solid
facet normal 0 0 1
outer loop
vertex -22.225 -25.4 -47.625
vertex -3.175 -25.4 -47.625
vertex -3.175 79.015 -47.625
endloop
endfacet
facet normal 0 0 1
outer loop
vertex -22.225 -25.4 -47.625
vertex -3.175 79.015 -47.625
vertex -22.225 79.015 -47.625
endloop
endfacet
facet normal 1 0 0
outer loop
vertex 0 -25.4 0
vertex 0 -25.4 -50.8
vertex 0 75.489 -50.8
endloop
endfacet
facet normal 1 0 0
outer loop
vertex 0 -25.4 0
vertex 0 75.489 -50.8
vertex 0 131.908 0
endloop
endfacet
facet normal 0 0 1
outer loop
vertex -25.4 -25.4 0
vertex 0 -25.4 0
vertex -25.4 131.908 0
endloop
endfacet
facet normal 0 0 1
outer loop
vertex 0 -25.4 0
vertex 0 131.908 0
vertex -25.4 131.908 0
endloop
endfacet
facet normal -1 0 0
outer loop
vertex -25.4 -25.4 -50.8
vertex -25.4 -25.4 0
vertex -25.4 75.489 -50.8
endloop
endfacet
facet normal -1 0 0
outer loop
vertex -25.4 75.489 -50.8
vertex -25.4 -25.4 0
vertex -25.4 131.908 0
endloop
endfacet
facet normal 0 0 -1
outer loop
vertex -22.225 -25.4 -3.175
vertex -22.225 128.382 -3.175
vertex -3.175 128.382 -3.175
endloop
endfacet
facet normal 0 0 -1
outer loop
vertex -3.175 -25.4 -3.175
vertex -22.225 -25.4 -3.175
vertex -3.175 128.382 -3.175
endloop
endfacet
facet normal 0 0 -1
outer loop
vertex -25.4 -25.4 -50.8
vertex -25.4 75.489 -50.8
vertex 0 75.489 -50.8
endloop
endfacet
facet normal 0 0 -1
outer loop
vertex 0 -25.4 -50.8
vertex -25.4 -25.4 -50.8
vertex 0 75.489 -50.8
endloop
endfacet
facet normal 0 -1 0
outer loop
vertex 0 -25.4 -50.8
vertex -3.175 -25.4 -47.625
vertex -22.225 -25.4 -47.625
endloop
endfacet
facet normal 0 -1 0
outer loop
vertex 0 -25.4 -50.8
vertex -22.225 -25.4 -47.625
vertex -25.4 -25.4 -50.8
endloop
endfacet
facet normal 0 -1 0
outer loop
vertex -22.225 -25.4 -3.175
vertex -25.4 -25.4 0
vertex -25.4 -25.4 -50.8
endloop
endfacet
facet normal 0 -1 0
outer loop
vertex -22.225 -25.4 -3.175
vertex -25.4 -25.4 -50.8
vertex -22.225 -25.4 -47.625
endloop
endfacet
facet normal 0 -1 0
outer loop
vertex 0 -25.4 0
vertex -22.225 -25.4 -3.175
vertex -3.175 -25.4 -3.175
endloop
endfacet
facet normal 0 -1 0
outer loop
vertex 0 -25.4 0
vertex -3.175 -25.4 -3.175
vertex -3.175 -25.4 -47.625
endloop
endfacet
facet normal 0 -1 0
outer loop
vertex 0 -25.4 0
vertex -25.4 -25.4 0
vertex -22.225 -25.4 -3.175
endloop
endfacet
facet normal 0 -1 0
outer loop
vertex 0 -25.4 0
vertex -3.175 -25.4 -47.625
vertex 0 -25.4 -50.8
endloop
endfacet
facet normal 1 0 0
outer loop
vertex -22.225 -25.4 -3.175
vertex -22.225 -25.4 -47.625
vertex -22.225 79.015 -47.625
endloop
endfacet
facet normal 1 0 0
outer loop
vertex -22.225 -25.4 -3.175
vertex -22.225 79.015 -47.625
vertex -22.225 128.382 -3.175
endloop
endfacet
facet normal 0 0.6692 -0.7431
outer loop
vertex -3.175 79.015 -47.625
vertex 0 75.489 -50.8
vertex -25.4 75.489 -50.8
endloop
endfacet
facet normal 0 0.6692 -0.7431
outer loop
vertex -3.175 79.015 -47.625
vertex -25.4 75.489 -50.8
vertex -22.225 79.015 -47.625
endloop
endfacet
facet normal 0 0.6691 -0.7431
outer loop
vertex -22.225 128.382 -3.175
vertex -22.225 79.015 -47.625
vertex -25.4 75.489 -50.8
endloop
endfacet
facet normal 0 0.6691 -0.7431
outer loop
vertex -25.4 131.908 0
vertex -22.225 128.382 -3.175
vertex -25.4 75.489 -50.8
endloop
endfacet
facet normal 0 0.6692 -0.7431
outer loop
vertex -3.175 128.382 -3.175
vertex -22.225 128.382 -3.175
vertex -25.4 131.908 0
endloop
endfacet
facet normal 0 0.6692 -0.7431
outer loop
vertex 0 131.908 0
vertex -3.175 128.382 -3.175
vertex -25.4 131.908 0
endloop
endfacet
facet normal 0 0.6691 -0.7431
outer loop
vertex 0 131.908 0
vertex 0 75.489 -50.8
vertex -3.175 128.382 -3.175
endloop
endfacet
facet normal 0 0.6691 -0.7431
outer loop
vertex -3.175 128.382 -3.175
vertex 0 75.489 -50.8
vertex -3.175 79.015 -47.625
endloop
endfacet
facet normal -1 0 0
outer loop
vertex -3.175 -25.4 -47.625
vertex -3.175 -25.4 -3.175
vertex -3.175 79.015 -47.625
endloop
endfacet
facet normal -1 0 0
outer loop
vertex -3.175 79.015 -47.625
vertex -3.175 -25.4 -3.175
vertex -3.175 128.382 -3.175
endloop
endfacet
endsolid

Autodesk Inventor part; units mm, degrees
ref_plane "YZ Plane" through (0, 0, 0) normal (1, 0, 0) x (0, 1, 0)
ref_plane "XZ Plane" through (0, 0, 0) normal (0, 1, 0) x (-1, 0, 0)
ref_plane "XY Plane" through (0, 0, 0) normal (0, 0, 1) x (1, 0, 0)
sketch "Sketch1" plane through (0, 0, 0) normal (0, 1, 0) x (-1, 0, 0)
  line L0 (0, 0) -> (25.4, 0)
  line L1 (25.4, 0) -> (25.4, -50.8)
  line L2 (25.4, -50.8) -> (0, -50.8)
  line L3 (0, -50.8) -> (0, 0)
  line L4 (22.225, -47.625) -> (22.225, -3.175)
  line L5 (22.225, -3.175) -> (3.175, -3.175)
  line L6 (3.175, -3.175) -> (3.175, -47.625)
  line L7 (3.175, -47.625) -> (22.225, -47.625)
  dimension "d0" = 25.4
  dimension "d1" = 50.8
  dimension "d2" = 3.175
extrude "Extrusion1" add sketch "Sketch1" along normal blind 75.4888
sketch "Sketch2" plane through (0, 0, 0) normal (1, 0, 0) x (0, 0, -1)
  line L0 (50.8, 0) -> (0, 0) projected
  line L1 (50.8, 0) -> (50.8, 75.4888) projected
  line L2 (0, 75.4888) -> (50.8, 75.4888) projected
  line L3 (0, 0) -> (0, 75.4888) projected
  line L4 (50.8, 75.4888) -> (0, 131.9079)
  line L5 (0, 131.9079) -> (0, 75.4888)
  dimension "d5" = 48
extrude "Extrusion2" add sketch "Sketch2" against normal blind 25.4 contours L2 L5 L4
sketch "Sketch3" plane through (0, 0, 0) normal (0, -1, 0) x (1, 0, 0)
  line L0 (-22.225, -47.625) -> (-3.175, -47.625) projected
  line L1 (-3.175, -47.625) -> (-3.175, -3.175) projected
  line L2 (-3.175, -3.175) -> (-22.225, -3.175) projected
  line L3 (-22.225, -3.175) -> (-22.225, -47.625) projected
  point P0 (0, 0)
extrude "Extrusion3" cut sketch "Sketch3" against normal through all
sketch "Sketch4" plane through (0, 0, 0) normal (0, -1, 0) x (1, 0, 0)
  line L0 (-3.175, -47.625) -> (-22.225, -47.625) projected
  line L1 (-22.225, -47.625) -> (-22.225, -3.175) projected
  line L2 (-22.225, -3.175) -> (-3.175, -3.175) projected
  line L3 (-3.175, -3.175) -> (-3.175, -47.625) projected
  line L4 (0, 0) -> (-25.4, 0) projected
  line L5 (-25.4, 0) -> (-25.4, -50.8) projected
  line L6 (-25.4, -50.8) -> (0, -50.8) projected
  line L7 (0, -50.8) -> (0, 0) projected
extrude "Extrusion4" add sketch "Sketch4" along normal blind 25.4
properties part number "SmallAnglesSupport.ver1-1111-2020"
